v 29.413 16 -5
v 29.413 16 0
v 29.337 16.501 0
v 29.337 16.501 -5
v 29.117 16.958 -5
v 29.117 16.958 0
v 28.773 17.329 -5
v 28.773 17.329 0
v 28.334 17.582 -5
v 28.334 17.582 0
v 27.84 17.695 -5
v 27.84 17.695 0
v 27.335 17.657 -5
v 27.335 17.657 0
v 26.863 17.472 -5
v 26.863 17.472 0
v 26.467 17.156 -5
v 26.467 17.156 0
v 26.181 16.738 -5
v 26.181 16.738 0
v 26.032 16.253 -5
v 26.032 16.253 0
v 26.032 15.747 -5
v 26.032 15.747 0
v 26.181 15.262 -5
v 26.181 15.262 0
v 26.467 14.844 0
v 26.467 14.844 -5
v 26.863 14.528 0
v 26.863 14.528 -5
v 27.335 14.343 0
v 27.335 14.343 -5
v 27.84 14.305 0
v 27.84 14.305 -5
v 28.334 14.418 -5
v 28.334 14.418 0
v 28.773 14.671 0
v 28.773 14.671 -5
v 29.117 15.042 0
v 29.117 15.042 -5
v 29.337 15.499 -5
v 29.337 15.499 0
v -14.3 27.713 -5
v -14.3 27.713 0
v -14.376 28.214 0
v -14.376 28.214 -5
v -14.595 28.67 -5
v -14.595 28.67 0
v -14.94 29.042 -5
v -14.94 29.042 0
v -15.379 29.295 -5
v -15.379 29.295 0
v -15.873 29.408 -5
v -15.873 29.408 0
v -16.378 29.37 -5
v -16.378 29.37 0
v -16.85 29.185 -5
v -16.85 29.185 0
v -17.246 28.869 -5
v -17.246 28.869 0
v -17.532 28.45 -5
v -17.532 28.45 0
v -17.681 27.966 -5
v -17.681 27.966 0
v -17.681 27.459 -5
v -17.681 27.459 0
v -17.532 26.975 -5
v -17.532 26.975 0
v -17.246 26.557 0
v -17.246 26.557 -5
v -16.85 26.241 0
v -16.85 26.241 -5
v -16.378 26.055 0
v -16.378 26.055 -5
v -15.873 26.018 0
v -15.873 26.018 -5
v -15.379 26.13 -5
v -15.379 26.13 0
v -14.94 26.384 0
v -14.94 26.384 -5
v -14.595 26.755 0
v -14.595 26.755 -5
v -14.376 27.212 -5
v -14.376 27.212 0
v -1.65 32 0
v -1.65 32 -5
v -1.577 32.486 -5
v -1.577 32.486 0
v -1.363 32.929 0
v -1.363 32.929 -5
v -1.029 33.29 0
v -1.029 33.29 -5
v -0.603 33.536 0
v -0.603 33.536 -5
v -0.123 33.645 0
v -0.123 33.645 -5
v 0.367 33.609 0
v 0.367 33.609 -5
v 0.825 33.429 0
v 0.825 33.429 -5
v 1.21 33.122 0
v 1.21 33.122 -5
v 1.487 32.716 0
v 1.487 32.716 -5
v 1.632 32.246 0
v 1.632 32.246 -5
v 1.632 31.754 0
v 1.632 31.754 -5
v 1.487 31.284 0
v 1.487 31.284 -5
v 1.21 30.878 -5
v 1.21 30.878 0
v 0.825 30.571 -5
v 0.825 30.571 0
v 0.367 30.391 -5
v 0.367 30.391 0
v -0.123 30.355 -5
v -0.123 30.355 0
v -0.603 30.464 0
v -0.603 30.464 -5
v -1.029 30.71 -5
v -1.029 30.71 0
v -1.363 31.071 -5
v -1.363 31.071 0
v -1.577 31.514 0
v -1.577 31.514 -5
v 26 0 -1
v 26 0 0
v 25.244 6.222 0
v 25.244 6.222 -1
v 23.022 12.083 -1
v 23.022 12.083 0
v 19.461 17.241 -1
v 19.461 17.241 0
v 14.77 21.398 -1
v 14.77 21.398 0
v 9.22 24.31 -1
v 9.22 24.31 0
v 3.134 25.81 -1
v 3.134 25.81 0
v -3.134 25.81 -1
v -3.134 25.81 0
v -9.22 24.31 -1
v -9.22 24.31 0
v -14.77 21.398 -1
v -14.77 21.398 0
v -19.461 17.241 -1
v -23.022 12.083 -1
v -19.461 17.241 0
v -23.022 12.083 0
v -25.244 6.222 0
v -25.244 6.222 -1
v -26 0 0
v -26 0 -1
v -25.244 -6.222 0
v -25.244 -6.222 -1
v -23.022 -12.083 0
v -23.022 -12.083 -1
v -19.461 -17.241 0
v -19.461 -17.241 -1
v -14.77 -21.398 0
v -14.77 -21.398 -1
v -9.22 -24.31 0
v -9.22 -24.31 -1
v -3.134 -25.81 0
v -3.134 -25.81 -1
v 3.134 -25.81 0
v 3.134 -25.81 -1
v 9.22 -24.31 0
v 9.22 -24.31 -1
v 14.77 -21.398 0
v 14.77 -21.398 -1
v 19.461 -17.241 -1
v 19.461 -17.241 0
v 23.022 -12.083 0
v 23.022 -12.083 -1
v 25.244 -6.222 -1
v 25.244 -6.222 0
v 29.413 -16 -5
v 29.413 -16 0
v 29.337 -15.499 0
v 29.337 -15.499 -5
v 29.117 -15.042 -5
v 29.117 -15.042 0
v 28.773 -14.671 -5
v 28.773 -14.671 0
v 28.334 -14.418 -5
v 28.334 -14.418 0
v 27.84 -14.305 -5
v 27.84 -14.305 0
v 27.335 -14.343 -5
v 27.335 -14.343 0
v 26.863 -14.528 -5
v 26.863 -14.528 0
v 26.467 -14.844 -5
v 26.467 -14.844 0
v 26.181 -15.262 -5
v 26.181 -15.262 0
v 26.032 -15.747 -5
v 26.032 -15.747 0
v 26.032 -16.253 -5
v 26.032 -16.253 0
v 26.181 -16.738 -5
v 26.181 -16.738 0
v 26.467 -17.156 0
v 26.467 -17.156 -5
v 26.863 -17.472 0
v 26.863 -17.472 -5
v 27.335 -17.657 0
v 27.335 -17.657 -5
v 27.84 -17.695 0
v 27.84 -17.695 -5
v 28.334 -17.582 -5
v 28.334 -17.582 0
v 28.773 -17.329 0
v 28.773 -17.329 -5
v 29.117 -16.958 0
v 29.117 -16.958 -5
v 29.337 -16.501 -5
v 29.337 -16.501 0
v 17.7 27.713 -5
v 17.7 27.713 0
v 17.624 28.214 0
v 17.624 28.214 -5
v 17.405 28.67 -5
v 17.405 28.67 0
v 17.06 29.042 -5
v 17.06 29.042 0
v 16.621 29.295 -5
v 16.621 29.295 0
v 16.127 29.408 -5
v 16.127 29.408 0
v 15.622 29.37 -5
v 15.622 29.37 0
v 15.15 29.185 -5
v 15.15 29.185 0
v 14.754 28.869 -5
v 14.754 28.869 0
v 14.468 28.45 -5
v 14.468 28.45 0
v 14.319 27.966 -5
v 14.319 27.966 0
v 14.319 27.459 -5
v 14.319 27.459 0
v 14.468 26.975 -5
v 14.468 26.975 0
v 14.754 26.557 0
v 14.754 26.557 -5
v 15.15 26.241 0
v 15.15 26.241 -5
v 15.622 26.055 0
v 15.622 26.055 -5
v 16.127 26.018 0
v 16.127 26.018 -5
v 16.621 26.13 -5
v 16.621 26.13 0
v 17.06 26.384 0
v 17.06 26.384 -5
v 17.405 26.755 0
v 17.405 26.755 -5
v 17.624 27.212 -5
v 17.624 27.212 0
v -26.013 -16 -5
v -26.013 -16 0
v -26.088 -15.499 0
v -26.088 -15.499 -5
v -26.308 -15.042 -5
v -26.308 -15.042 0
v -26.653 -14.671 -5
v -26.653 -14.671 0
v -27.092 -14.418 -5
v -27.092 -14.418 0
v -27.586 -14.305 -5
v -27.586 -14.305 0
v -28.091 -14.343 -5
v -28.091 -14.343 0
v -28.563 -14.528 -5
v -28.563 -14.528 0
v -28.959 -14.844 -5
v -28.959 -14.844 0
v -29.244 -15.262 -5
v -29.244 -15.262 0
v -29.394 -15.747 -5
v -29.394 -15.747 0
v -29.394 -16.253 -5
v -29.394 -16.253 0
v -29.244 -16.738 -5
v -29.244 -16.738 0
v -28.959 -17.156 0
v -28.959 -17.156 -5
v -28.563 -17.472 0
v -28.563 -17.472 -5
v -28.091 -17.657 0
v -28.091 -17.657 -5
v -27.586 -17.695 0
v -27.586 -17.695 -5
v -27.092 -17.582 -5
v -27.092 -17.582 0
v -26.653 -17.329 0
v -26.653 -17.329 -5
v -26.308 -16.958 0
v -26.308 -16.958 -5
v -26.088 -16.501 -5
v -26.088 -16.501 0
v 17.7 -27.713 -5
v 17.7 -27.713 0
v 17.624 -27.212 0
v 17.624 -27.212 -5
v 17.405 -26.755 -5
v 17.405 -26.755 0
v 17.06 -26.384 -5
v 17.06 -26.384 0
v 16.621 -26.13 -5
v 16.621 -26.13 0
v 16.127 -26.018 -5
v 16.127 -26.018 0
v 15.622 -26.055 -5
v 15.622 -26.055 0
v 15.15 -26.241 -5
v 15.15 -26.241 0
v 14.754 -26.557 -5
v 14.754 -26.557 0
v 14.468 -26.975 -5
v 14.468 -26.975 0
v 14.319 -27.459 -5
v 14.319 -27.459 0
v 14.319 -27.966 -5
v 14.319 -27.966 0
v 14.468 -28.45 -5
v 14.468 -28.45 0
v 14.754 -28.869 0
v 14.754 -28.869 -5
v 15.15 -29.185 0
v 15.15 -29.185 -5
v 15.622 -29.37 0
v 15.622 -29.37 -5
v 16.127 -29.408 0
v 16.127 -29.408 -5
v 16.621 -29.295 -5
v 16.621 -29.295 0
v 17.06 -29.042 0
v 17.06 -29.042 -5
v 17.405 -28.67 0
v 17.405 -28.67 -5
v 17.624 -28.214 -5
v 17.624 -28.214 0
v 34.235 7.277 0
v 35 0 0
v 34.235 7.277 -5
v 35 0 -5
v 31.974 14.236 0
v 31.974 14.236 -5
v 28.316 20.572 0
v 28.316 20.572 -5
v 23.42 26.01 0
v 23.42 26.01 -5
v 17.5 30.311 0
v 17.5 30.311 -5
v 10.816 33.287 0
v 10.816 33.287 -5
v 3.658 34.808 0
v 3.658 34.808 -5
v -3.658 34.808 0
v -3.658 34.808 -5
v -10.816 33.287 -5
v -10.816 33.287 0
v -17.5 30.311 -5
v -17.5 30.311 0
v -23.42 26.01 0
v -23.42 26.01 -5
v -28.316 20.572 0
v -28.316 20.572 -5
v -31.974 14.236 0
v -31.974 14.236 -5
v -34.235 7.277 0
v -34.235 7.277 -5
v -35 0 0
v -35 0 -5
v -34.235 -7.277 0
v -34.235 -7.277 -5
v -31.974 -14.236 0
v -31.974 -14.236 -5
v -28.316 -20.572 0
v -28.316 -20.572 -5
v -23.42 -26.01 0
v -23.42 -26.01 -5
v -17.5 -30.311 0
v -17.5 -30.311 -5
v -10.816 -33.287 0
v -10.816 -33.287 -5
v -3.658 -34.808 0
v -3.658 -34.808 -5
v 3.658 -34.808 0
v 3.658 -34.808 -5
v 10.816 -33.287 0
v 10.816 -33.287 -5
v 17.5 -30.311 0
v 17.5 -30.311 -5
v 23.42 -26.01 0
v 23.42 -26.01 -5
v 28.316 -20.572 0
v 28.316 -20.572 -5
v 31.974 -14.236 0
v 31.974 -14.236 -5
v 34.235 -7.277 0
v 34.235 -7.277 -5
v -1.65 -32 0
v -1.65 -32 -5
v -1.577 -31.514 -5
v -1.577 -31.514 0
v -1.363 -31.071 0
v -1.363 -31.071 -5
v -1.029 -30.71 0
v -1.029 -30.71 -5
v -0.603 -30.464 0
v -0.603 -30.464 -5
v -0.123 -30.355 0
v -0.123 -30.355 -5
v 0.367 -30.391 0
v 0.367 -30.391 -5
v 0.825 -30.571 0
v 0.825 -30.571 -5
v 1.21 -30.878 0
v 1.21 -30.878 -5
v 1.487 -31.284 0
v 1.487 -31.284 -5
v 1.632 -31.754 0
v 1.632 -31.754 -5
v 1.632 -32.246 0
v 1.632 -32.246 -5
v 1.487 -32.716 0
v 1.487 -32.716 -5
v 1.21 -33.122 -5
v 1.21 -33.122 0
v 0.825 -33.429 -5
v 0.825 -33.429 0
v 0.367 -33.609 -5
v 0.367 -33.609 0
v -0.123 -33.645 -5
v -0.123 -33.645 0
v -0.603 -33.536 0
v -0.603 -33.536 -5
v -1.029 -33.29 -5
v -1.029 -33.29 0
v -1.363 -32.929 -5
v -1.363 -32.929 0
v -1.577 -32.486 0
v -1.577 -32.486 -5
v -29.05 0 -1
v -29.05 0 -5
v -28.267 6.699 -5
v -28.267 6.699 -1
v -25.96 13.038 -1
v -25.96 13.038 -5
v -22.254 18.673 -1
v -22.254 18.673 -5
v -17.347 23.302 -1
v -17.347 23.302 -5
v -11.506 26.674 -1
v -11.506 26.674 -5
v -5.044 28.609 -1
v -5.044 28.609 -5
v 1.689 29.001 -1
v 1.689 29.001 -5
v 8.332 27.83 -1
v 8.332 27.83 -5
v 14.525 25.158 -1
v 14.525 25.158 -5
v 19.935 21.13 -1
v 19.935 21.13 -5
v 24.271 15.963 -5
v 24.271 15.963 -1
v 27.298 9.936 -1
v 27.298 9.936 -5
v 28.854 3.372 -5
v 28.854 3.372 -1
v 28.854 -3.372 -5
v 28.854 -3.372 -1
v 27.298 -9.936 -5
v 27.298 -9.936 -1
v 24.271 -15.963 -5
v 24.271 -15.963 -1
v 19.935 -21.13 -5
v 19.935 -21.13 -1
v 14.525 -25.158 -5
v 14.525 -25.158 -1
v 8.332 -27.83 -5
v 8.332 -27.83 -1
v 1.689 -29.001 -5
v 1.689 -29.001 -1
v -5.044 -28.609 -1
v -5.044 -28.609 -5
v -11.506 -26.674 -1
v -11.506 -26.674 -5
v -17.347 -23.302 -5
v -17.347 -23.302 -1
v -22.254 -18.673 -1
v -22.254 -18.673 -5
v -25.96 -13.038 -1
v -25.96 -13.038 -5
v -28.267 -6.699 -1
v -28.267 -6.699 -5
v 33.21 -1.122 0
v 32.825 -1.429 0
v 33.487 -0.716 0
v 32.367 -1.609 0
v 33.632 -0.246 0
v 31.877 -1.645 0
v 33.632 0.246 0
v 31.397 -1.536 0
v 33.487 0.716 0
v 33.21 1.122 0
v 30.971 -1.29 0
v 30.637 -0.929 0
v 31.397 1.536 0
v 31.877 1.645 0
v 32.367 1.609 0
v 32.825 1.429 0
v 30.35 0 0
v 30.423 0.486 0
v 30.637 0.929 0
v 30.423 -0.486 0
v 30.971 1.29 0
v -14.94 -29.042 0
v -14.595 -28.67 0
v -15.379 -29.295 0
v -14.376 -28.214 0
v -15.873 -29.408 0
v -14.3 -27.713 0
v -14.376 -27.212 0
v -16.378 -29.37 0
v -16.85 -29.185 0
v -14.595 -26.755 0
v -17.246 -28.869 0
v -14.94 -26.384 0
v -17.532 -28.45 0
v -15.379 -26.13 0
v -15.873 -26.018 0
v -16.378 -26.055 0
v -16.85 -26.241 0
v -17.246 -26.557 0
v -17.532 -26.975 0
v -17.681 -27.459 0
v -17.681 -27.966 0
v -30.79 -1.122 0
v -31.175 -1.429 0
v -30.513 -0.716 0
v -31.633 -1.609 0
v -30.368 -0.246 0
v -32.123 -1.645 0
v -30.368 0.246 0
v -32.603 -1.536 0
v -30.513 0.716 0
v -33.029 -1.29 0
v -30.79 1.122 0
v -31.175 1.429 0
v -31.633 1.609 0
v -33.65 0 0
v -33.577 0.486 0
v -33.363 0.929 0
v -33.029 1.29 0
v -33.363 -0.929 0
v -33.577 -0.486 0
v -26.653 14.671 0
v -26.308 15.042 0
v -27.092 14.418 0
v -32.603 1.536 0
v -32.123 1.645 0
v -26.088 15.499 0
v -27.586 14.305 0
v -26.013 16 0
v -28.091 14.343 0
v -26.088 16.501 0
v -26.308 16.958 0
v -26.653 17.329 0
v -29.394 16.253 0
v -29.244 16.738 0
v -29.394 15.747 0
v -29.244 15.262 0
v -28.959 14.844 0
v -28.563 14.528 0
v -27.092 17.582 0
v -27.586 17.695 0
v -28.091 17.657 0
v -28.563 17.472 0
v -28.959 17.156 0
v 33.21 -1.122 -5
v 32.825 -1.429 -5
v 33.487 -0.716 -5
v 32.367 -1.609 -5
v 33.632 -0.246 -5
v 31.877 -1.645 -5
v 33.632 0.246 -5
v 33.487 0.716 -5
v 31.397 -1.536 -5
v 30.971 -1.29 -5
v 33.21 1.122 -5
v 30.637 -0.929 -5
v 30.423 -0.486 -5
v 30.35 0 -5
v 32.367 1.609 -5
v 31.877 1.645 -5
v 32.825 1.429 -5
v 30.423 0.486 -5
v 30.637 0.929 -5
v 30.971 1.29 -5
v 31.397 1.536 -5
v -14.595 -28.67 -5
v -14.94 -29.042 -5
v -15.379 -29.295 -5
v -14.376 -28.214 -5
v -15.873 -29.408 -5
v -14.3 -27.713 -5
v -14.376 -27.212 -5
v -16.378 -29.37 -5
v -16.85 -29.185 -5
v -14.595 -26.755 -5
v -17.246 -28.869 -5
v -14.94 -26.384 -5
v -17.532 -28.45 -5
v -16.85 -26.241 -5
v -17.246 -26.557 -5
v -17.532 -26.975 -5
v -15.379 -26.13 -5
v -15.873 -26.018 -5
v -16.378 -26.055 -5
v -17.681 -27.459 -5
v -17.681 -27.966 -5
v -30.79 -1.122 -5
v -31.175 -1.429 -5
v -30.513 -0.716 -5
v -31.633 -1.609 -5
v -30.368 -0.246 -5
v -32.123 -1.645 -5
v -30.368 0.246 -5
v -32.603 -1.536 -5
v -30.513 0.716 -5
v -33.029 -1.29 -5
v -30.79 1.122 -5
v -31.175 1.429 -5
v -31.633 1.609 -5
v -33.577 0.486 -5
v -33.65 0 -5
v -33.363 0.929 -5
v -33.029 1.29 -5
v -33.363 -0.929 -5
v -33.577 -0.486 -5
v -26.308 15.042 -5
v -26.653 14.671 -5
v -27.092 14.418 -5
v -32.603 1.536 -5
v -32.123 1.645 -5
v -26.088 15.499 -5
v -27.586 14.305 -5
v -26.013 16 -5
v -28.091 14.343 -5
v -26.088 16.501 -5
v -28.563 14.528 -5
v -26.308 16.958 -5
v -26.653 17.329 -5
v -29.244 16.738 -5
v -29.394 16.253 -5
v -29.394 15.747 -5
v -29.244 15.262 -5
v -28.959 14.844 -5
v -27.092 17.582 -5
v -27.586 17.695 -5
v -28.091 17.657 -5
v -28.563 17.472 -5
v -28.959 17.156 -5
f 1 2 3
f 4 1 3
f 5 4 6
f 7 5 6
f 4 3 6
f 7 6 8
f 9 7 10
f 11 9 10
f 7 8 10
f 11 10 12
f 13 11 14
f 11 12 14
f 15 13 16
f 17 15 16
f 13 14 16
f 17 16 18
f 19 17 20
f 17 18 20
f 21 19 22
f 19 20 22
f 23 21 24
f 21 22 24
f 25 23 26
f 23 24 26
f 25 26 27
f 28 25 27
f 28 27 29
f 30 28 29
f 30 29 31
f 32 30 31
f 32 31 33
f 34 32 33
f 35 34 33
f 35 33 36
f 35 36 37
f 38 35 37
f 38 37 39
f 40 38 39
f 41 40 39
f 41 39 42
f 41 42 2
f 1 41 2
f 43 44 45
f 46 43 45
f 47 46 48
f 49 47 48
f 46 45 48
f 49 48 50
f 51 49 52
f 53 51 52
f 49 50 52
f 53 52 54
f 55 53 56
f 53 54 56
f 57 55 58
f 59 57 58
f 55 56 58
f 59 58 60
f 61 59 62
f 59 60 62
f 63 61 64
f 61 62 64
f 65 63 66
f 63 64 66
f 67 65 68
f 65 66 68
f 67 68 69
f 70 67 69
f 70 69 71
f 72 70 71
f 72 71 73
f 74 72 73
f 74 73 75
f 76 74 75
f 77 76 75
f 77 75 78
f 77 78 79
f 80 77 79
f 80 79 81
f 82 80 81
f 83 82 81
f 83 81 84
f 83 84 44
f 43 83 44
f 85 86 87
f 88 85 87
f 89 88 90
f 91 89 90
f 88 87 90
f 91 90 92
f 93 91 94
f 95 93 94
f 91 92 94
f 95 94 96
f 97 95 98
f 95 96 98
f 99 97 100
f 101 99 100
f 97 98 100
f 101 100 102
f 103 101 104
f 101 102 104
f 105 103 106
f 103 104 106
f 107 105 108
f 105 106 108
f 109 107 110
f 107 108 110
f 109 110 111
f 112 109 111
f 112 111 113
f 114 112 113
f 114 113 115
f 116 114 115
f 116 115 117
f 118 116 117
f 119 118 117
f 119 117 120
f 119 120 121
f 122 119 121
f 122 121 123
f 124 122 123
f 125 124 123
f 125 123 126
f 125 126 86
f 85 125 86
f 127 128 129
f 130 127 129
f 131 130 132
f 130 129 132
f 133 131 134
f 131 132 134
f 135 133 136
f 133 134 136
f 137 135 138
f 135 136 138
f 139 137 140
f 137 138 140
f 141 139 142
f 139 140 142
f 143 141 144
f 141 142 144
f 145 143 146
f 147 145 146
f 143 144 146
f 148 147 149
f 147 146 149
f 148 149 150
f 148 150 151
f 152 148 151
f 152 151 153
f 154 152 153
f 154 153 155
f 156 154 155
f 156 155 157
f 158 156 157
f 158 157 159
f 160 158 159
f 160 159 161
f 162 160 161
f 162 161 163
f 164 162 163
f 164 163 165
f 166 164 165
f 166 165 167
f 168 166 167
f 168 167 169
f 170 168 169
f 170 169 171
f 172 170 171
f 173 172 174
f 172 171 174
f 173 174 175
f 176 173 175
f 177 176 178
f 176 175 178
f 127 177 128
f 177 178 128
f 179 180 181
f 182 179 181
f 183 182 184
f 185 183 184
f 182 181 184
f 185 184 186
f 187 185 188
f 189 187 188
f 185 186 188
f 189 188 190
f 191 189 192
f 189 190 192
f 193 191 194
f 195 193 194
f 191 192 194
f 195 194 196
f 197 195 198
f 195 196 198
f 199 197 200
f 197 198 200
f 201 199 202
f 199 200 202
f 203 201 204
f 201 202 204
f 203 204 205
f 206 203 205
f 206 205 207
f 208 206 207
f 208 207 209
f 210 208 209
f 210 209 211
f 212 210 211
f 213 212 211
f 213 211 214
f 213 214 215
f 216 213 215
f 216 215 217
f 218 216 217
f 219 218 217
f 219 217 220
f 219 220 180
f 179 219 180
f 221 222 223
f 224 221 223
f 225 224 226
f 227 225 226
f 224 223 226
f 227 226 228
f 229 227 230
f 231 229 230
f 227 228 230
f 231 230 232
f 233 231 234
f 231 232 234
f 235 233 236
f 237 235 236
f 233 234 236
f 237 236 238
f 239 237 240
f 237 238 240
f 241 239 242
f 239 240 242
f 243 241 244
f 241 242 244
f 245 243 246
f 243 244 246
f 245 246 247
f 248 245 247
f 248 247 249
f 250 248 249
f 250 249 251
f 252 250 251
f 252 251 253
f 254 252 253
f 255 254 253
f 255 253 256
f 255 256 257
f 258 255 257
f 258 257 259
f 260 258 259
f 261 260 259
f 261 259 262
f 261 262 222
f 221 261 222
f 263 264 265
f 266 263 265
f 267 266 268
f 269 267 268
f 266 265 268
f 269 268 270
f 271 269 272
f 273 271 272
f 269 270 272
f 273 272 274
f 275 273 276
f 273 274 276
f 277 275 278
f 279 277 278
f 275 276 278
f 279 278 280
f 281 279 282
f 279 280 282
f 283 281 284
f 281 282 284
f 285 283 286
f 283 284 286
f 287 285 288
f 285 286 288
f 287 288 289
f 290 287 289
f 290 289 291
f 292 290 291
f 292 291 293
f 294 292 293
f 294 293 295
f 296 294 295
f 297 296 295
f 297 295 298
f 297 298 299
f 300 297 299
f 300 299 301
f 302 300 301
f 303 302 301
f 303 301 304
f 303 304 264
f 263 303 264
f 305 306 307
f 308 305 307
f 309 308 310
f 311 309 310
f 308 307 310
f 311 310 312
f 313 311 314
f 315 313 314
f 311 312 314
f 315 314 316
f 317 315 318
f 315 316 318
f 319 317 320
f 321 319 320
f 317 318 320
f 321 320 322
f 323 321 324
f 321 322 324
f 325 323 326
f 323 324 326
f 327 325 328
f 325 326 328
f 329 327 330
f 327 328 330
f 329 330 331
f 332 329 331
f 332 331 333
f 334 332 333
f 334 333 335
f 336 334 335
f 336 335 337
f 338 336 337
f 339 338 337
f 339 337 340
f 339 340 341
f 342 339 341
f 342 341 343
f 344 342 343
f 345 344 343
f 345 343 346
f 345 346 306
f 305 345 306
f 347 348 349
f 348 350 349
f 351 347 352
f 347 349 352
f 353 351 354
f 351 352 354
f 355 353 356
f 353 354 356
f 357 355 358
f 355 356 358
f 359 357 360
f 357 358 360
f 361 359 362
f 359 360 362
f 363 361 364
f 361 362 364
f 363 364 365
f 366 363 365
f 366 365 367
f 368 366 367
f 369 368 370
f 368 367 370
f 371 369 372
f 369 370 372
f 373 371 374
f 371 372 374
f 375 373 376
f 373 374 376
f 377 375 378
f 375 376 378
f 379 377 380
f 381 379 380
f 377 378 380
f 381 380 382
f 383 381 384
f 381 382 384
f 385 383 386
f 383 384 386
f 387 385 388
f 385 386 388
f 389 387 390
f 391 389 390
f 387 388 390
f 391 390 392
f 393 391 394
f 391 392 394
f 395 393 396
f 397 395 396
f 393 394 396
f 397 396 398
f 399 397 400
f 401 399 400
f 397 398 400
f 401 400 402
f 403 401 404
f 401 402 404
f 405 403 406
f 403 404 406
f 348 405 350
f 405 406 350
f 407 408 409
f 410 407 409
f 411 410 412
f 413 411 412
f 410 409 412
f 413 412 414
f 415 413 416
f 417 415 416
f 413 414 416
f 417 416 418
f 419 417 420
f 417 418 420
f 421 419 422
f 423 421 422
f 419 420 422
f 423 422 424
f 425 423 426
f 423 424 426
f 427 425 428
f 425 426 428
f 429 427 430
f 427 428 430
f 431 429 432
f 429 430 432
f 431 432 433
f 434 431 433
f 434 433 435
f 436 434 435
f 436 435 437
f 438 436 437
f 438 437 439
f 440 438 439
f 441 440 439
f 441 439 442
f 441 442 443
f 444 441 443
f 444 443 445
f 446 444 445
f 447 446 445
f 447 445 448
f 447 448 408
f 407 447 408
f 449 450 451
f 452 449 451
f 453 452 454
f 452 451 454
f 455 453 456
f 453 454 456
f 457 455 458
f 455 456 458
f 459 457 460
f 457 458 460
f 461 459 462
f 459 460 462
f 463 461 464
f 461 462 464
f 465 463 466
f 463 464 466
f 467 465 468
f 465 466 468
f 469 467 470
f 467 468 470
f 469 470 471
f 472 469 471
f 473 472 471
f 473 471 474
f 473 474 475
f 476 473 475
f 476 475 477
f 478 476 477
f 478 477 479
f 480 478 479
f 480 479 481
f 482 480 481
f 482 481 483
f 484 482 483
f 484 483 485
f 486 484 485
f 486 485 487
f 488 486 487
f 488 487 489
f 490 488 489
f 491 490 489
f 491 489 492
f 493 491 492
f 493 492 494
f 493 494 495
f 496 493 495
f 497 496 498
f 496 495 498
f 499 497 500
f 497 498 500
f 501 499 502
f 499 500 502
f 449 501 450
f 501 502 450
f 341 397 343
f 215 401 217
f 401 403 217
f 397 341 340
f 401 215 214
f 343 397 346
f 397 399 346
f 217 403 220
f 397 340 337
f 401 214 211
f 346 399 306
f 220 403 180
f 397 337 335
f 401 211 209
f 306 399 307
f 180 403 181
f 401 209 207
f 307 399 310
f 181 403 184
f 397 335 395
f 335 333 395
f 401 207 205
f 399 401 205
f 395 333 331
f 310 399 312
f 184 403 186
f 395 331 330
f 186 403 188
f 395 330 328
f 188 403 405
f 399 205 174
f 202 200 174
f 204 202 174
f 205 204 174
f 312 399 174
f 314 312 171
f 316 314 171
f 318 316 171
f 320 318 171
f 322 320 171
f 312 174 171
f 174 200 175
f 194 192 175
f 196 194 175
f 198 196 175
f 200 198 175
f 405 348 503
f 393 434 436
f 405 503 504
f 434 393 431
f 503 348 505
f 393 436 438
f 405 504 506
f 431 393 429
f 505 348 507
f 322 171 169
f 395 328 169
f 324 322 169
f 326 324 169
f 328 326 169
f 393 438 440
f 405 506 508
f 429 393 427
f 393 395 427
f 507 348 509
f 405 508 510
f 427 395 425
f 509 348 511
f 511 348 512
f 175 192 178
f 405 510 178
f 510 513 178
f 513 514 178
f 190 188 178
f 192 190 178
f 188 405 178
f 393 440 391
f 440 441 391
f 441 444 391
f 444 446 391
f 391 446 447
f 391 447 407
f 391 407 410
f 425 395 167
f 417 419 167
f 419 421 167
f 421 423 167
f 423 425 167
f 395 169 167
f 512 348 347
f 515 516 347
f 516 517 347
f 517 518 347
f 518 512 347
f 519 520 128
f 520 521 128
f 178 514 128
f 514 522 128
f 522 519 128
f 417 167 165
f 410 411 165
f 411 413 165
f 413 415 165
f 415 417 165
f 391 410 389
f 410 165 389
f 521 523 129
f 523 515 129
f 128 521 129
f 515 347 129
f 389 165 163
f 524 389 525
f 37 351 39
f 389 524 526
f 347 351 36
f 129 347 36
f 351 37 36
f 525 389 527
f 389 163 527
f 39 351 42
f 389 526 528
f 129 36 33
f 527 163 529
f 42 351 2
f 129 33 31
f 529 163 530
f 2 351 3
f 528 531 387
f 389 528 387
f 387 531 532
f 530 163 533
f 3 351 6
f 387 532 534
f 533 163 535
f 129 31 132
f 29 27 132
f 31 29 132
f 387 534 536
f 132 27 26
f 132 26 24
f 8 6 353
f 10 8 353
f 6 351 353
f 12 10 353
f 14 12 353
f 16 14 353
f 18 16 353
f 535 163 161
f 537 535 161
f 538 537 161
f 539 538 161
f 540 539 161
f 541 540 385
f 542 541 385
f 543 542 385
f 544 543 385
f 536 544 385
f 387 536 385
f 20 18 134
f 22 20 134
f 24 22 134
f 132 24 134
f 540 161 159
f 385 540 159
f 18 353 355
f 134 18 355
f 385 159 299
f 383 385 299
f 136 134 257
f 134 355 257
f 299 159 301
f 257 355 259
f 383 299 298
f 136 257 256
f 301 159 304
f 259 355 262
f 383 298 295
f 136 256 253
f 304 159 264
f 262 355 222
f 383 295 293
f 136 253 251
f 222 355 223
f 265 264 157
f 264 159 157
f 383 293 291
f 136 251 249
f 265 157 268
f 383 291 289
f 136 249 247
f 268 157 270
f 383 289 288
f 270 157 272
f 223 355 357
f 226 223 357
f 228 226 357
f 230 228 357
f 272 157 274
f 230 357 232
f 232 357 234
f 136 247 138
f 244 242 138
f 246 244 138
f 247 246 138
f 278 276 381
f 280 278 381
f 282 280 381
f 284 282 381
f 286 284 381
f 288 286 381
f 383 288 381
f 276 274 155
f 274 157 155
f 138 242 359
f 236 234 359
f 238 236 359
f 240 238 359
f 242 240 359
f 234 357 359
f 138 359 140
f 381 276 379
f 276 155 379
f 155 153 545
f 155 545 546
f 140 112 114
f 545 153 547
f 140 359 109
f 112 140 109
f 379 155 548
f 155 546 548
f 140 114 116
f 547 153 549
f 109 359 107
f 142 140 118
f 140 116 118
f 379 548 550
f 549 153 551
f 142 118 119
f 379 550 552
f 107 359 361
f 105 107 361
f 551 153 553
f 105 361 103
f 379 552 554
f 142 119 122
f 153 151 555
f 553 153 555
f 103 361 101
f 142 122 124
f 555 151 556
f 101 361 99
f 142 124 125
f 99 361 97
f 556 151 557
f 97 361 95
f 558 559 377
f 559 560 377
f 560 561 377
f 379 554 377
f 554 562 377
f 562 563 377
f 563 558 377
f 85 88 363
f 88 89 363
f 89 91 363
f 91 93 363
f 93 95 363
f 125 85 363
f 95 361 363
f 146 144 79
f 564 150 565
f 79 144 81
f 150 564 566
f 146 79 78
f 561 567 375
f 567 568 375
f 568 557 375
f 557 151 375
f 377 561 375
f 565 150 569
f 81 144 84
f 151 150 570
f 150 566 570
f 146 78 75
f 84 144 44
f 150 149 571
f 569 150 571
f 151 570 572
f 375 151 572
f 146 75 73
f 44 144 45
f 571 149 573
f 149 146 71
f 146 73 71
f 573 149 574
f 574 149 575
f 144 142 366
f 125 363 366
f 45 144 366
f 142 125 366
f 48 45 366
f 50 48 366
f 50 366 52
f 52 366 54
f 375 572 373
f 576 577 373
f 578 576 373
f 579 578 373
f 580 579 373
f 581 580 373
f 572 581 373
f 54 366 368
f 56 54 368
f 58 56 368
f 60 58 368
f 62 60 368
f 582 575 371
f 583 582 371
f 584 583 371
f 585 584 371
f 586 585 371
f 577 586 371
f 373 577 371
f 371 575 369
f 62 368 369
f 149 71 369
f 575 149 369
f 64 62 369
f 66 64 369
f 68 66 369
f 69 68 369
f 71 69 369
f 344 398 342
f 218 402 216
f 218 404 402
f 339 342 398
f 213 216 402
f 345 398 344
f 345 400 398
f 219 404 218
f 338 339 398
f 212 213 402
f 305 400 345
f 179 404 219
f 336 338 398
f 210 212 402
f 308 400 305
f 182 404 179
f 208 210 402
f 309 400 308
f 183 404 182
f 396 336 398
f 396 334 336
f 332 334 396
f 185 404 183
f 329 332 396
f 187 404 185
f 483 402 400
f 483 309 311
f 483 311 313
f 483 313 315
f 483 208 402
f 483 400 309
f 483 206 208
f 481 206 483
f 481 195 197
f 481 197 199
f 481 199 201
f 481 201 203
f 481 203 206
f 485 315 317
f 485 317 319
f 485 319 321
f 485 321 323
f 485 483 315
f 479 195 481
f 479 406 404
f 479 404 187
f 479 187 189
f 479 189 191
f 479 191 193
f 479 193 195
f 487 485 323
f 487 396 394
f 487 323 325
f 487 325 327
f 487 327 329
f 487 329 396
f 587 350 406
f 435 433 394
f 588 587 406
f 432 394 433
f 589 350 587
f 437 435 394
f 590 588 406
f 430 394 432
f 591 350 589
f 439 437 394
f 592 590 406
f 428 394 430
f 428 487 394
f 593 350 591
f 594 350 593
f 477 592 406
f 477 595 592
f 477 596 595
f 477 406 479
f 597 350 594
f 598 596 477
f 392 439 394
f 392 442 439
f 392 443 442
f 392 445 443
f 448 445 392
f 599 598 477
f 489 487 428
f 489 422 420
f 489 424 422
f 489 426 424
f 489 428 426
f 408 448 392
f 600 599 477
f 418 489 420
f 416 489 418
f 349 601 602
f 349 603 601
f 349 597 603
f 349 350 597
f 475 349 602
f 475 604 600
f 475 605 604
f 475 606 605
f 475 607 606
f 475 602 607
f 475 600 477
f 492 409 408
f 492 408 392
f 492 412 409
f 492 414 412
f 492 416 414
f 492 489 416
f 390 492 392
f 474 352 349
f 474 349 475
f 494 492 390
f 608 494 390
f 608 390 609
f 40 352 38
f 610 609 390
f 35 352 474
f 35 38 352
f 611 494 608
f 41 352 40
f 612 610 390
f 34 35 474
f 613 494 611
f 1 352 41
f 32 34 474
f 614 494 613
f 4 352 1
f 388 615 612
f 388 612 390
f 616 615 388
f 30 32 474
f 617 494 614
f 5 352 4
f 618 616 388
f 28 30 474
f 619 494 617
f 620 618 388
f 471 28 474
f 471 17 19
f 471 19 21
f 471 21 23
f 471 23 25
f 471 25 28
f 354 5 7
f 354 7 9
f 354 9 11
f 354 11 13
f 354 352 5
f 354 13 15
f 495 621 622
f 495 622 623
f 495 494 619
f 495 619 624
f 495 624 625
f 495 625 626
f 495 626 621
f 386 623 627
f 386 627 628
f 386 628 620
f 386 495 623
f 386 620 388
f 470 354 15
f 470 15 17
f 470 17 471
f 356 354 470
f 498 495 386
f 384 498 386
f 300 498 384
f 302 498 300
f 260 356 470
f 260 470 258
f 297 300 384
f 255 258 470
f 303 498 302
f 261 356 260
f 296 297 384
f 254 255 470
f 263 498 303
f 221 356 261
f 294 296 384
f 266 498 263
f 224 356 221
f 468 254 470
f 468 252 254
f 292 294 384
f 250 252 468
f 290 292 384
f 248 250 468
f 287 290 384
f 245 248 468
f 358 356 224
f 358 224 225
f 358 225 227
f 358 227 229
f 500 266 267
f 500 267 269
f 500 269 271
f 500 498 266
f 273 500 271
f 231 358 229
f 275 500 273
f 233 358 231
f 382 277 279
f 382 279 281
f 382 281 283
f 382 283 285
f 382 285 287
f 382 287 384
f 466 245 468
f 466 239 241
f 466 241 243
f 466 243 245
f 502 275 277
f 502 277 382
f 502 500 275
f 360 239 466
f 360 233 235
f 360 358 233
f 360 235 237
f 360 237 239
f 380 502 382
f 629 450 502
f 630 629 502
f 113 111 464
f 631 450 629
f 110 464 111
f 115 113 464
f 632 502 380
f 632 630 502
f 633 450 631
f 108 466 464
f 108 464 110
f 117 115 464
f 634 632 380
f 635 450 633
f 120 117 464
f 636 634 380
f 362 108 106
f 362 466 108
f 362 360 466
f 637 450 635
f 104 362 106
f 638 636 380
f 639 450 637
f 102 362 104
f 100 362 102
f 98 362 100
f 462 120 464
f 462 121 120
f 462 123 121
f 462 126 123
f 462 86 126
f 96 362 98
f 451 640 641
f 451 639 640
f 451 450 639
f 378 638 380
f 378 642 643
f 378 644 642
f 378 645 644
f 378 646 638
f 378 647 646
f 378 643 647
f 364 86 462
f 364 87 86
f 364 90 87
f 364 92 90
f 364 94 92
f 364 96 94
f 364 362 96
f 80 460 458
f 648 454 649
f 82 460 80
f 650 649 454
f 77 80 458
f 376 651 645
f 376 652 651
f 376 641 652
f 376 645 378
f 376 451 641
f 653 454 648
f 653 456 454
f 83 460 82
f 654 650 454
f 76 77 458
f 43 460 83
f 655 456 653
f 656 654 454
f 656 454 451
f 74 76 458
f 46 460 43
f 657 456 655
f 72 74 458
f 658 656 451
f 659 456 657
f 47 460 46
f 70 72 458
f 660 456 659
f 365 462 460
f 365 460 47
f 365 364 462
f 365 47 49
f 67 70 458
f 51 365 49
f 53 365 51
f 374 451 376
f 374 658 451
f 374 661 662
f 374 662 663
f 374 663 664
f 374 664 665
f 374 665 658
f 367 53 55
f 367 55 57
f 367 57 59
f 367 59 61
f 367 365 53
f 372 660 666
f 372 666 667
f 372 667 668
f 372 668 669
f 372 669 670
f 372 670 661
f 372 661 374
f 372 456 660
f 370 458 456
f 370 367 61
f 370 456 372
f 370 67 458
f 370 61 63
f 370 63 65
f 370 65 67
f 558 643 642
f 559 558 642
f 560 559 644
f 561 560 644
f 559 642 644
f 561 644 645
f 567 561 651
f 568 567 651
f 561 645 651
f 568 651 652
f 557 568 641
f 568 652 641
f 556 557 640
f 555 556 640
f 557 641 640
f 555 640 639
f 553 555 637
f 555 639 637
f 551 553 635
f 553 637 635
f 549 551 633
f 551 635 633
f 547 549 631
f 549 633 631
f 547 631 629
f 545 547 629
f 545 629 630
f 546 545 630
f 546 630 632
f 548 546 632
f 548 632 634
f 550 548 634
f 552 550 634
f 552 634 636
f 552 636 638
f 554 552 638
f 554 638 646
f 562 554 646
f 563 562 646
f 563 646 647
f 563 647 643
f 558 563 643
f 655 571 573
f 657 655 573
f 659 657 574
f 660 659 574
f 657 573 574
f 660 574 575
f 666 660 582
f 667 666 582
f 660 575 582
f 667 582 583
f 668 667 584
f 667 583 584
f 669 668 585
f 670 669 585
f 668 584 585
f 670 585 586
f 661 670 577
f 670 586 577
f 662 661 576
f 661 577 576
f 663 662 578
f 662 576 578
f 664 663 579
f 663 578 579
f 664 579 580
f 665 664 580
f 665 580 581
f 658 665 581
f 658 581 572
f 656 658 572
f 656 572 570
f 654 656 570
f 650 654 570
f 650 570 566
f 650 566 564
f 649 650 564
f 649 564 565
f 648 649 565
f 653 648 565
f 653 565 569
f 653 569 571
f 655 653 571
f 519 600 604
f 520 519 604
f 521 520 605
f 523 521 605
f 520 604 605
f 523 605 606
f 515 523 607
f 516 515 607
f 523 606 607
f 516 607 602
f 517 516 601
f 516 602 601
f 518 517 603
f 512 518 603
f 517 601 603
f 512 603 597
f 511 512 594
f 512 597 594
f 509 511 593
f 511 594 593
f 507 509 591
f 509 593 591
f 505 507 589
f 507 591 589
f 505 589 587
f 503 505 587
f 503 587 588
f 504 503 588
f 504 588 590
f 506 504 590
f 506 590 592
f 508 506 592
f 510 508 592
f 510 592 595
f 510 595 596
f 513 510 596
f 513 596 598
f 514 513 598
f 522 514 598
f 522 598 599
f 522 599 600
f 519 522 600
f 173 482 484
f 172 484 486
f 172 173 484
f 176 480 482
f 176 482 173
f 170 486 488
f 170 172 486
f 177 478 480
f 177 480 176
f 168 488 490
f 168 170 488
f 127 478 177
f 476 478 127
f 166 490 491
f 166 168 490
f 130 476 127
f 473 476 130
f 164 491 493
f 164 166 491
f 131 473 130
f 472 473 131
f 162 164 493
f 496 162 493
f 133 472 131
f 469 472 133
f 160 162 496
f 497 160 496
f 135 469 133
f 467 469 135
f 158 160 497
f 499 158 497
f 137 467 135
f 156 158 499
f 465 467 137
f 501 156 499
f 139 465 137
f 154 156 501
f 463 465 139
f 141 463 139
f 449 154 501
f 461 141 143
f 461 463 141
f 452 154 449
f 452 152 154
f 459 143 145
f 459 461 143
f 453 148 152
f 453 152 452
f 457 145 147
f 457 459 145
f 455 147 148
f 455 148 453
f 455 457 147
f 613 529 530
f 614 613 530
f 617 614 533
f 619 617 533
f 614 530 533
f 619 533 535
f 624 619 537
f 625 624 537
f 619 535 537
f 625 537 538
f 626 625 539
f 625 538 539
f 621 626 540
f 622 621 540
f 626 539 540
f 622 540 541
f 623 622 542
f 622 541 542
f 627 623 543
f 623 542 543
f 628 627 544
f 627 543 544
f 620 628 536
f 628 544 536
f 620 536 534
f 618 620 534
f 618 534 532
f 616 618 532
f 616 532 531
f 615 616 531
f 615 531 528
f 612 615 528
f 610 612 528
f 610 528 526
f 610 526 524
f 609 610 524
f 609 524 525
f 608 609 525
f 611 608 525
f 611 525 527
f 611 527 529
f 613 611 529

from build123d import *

# Parameters (mm, degrees)
SKETCH_1_W                = 35
SKETCH_1_H                = 5
HOLE_WIZARD_1_D           = 3.4
HOLE_WIZARD_1_DEPTH       = 5
HOLE_WIZARD_2_D           = 52
HOLE_WIZARD_2_DEPTH       = 5
HOLE_WIZARD_2_CBORE_D     = 58.1
HOLE_WIZARD_2_CBORE_DEPTH = 4
SKETCH_9_R                = 1.65
CUT_EXTRUDE_1_DEPTH       = 10


with BuildPart() as part:
    # 草图1 → 旋转1 (revolve)
    with BuildSketch(Plane(origin=(0, 0, 0), x_dir=(1, 0, 0), z_dir=(0, 1, 0))):
        with Locations((17.5, 2.5)):
            Rectangle(SKETCH_1_W, SKETCH_1_H)
    revolve(axis=Axis((0, 0, -5), (0, 0, 1)))

    # 孔1
    with Locations(Plane(origin=(0, 0, -5), x_dir=(-1, 0, 0), z_dir=(0, 0, -1))):
        with Locations((16, -27.712812921), (-16, -27.712812921), (-27.712812921, -16), (-27.712812921, 16), (-16, 27.712812921), (16, 27.712812921), (27.712812921, 16), (27.712812921, -16)):
            Hole(HOLE_WIZARD_1_D / 2, depth=HOLE_WIZARD_1_DEPTH)

    # 孔2
    with Locations(Plane(origin=(0, 0, -5), x_dir=(-1, 0, 0), z_dir=(0, 0, -1))):
        with Locations((0, 0)):
            CounterBoreHole(HOLE_WIZARD_2_D / 2, HOLE_WIZARD_2_CBORE_D / 2, HOLE_WIZARD_2_CBORE_DEPTH, depth=HOLE_WIZARD_2_DEPTH)

    # 草图9 → 切除-拉伸1 (cut)
    with BuildSketch(Plane(origin=(0, 0, -5), x_dir=(-1, 0, 0), z_dir=(0, 0, -1))):
        with Locations((32, 0)):
            Circle(SKETCH_9_R)
        with Locations((0, -32)):
            Circle(SKETCH_9_R)
        with Locations((-32, 0)):
            Circle(SKETCH_9_R)
        with Locations((0, 32)):
            Circle(SKETCH_9_R)
    extrude(amount=-CUT_EXTRUDE_1_DEPTH, mode=Mode.SUBTRACT)


solid = part.part
